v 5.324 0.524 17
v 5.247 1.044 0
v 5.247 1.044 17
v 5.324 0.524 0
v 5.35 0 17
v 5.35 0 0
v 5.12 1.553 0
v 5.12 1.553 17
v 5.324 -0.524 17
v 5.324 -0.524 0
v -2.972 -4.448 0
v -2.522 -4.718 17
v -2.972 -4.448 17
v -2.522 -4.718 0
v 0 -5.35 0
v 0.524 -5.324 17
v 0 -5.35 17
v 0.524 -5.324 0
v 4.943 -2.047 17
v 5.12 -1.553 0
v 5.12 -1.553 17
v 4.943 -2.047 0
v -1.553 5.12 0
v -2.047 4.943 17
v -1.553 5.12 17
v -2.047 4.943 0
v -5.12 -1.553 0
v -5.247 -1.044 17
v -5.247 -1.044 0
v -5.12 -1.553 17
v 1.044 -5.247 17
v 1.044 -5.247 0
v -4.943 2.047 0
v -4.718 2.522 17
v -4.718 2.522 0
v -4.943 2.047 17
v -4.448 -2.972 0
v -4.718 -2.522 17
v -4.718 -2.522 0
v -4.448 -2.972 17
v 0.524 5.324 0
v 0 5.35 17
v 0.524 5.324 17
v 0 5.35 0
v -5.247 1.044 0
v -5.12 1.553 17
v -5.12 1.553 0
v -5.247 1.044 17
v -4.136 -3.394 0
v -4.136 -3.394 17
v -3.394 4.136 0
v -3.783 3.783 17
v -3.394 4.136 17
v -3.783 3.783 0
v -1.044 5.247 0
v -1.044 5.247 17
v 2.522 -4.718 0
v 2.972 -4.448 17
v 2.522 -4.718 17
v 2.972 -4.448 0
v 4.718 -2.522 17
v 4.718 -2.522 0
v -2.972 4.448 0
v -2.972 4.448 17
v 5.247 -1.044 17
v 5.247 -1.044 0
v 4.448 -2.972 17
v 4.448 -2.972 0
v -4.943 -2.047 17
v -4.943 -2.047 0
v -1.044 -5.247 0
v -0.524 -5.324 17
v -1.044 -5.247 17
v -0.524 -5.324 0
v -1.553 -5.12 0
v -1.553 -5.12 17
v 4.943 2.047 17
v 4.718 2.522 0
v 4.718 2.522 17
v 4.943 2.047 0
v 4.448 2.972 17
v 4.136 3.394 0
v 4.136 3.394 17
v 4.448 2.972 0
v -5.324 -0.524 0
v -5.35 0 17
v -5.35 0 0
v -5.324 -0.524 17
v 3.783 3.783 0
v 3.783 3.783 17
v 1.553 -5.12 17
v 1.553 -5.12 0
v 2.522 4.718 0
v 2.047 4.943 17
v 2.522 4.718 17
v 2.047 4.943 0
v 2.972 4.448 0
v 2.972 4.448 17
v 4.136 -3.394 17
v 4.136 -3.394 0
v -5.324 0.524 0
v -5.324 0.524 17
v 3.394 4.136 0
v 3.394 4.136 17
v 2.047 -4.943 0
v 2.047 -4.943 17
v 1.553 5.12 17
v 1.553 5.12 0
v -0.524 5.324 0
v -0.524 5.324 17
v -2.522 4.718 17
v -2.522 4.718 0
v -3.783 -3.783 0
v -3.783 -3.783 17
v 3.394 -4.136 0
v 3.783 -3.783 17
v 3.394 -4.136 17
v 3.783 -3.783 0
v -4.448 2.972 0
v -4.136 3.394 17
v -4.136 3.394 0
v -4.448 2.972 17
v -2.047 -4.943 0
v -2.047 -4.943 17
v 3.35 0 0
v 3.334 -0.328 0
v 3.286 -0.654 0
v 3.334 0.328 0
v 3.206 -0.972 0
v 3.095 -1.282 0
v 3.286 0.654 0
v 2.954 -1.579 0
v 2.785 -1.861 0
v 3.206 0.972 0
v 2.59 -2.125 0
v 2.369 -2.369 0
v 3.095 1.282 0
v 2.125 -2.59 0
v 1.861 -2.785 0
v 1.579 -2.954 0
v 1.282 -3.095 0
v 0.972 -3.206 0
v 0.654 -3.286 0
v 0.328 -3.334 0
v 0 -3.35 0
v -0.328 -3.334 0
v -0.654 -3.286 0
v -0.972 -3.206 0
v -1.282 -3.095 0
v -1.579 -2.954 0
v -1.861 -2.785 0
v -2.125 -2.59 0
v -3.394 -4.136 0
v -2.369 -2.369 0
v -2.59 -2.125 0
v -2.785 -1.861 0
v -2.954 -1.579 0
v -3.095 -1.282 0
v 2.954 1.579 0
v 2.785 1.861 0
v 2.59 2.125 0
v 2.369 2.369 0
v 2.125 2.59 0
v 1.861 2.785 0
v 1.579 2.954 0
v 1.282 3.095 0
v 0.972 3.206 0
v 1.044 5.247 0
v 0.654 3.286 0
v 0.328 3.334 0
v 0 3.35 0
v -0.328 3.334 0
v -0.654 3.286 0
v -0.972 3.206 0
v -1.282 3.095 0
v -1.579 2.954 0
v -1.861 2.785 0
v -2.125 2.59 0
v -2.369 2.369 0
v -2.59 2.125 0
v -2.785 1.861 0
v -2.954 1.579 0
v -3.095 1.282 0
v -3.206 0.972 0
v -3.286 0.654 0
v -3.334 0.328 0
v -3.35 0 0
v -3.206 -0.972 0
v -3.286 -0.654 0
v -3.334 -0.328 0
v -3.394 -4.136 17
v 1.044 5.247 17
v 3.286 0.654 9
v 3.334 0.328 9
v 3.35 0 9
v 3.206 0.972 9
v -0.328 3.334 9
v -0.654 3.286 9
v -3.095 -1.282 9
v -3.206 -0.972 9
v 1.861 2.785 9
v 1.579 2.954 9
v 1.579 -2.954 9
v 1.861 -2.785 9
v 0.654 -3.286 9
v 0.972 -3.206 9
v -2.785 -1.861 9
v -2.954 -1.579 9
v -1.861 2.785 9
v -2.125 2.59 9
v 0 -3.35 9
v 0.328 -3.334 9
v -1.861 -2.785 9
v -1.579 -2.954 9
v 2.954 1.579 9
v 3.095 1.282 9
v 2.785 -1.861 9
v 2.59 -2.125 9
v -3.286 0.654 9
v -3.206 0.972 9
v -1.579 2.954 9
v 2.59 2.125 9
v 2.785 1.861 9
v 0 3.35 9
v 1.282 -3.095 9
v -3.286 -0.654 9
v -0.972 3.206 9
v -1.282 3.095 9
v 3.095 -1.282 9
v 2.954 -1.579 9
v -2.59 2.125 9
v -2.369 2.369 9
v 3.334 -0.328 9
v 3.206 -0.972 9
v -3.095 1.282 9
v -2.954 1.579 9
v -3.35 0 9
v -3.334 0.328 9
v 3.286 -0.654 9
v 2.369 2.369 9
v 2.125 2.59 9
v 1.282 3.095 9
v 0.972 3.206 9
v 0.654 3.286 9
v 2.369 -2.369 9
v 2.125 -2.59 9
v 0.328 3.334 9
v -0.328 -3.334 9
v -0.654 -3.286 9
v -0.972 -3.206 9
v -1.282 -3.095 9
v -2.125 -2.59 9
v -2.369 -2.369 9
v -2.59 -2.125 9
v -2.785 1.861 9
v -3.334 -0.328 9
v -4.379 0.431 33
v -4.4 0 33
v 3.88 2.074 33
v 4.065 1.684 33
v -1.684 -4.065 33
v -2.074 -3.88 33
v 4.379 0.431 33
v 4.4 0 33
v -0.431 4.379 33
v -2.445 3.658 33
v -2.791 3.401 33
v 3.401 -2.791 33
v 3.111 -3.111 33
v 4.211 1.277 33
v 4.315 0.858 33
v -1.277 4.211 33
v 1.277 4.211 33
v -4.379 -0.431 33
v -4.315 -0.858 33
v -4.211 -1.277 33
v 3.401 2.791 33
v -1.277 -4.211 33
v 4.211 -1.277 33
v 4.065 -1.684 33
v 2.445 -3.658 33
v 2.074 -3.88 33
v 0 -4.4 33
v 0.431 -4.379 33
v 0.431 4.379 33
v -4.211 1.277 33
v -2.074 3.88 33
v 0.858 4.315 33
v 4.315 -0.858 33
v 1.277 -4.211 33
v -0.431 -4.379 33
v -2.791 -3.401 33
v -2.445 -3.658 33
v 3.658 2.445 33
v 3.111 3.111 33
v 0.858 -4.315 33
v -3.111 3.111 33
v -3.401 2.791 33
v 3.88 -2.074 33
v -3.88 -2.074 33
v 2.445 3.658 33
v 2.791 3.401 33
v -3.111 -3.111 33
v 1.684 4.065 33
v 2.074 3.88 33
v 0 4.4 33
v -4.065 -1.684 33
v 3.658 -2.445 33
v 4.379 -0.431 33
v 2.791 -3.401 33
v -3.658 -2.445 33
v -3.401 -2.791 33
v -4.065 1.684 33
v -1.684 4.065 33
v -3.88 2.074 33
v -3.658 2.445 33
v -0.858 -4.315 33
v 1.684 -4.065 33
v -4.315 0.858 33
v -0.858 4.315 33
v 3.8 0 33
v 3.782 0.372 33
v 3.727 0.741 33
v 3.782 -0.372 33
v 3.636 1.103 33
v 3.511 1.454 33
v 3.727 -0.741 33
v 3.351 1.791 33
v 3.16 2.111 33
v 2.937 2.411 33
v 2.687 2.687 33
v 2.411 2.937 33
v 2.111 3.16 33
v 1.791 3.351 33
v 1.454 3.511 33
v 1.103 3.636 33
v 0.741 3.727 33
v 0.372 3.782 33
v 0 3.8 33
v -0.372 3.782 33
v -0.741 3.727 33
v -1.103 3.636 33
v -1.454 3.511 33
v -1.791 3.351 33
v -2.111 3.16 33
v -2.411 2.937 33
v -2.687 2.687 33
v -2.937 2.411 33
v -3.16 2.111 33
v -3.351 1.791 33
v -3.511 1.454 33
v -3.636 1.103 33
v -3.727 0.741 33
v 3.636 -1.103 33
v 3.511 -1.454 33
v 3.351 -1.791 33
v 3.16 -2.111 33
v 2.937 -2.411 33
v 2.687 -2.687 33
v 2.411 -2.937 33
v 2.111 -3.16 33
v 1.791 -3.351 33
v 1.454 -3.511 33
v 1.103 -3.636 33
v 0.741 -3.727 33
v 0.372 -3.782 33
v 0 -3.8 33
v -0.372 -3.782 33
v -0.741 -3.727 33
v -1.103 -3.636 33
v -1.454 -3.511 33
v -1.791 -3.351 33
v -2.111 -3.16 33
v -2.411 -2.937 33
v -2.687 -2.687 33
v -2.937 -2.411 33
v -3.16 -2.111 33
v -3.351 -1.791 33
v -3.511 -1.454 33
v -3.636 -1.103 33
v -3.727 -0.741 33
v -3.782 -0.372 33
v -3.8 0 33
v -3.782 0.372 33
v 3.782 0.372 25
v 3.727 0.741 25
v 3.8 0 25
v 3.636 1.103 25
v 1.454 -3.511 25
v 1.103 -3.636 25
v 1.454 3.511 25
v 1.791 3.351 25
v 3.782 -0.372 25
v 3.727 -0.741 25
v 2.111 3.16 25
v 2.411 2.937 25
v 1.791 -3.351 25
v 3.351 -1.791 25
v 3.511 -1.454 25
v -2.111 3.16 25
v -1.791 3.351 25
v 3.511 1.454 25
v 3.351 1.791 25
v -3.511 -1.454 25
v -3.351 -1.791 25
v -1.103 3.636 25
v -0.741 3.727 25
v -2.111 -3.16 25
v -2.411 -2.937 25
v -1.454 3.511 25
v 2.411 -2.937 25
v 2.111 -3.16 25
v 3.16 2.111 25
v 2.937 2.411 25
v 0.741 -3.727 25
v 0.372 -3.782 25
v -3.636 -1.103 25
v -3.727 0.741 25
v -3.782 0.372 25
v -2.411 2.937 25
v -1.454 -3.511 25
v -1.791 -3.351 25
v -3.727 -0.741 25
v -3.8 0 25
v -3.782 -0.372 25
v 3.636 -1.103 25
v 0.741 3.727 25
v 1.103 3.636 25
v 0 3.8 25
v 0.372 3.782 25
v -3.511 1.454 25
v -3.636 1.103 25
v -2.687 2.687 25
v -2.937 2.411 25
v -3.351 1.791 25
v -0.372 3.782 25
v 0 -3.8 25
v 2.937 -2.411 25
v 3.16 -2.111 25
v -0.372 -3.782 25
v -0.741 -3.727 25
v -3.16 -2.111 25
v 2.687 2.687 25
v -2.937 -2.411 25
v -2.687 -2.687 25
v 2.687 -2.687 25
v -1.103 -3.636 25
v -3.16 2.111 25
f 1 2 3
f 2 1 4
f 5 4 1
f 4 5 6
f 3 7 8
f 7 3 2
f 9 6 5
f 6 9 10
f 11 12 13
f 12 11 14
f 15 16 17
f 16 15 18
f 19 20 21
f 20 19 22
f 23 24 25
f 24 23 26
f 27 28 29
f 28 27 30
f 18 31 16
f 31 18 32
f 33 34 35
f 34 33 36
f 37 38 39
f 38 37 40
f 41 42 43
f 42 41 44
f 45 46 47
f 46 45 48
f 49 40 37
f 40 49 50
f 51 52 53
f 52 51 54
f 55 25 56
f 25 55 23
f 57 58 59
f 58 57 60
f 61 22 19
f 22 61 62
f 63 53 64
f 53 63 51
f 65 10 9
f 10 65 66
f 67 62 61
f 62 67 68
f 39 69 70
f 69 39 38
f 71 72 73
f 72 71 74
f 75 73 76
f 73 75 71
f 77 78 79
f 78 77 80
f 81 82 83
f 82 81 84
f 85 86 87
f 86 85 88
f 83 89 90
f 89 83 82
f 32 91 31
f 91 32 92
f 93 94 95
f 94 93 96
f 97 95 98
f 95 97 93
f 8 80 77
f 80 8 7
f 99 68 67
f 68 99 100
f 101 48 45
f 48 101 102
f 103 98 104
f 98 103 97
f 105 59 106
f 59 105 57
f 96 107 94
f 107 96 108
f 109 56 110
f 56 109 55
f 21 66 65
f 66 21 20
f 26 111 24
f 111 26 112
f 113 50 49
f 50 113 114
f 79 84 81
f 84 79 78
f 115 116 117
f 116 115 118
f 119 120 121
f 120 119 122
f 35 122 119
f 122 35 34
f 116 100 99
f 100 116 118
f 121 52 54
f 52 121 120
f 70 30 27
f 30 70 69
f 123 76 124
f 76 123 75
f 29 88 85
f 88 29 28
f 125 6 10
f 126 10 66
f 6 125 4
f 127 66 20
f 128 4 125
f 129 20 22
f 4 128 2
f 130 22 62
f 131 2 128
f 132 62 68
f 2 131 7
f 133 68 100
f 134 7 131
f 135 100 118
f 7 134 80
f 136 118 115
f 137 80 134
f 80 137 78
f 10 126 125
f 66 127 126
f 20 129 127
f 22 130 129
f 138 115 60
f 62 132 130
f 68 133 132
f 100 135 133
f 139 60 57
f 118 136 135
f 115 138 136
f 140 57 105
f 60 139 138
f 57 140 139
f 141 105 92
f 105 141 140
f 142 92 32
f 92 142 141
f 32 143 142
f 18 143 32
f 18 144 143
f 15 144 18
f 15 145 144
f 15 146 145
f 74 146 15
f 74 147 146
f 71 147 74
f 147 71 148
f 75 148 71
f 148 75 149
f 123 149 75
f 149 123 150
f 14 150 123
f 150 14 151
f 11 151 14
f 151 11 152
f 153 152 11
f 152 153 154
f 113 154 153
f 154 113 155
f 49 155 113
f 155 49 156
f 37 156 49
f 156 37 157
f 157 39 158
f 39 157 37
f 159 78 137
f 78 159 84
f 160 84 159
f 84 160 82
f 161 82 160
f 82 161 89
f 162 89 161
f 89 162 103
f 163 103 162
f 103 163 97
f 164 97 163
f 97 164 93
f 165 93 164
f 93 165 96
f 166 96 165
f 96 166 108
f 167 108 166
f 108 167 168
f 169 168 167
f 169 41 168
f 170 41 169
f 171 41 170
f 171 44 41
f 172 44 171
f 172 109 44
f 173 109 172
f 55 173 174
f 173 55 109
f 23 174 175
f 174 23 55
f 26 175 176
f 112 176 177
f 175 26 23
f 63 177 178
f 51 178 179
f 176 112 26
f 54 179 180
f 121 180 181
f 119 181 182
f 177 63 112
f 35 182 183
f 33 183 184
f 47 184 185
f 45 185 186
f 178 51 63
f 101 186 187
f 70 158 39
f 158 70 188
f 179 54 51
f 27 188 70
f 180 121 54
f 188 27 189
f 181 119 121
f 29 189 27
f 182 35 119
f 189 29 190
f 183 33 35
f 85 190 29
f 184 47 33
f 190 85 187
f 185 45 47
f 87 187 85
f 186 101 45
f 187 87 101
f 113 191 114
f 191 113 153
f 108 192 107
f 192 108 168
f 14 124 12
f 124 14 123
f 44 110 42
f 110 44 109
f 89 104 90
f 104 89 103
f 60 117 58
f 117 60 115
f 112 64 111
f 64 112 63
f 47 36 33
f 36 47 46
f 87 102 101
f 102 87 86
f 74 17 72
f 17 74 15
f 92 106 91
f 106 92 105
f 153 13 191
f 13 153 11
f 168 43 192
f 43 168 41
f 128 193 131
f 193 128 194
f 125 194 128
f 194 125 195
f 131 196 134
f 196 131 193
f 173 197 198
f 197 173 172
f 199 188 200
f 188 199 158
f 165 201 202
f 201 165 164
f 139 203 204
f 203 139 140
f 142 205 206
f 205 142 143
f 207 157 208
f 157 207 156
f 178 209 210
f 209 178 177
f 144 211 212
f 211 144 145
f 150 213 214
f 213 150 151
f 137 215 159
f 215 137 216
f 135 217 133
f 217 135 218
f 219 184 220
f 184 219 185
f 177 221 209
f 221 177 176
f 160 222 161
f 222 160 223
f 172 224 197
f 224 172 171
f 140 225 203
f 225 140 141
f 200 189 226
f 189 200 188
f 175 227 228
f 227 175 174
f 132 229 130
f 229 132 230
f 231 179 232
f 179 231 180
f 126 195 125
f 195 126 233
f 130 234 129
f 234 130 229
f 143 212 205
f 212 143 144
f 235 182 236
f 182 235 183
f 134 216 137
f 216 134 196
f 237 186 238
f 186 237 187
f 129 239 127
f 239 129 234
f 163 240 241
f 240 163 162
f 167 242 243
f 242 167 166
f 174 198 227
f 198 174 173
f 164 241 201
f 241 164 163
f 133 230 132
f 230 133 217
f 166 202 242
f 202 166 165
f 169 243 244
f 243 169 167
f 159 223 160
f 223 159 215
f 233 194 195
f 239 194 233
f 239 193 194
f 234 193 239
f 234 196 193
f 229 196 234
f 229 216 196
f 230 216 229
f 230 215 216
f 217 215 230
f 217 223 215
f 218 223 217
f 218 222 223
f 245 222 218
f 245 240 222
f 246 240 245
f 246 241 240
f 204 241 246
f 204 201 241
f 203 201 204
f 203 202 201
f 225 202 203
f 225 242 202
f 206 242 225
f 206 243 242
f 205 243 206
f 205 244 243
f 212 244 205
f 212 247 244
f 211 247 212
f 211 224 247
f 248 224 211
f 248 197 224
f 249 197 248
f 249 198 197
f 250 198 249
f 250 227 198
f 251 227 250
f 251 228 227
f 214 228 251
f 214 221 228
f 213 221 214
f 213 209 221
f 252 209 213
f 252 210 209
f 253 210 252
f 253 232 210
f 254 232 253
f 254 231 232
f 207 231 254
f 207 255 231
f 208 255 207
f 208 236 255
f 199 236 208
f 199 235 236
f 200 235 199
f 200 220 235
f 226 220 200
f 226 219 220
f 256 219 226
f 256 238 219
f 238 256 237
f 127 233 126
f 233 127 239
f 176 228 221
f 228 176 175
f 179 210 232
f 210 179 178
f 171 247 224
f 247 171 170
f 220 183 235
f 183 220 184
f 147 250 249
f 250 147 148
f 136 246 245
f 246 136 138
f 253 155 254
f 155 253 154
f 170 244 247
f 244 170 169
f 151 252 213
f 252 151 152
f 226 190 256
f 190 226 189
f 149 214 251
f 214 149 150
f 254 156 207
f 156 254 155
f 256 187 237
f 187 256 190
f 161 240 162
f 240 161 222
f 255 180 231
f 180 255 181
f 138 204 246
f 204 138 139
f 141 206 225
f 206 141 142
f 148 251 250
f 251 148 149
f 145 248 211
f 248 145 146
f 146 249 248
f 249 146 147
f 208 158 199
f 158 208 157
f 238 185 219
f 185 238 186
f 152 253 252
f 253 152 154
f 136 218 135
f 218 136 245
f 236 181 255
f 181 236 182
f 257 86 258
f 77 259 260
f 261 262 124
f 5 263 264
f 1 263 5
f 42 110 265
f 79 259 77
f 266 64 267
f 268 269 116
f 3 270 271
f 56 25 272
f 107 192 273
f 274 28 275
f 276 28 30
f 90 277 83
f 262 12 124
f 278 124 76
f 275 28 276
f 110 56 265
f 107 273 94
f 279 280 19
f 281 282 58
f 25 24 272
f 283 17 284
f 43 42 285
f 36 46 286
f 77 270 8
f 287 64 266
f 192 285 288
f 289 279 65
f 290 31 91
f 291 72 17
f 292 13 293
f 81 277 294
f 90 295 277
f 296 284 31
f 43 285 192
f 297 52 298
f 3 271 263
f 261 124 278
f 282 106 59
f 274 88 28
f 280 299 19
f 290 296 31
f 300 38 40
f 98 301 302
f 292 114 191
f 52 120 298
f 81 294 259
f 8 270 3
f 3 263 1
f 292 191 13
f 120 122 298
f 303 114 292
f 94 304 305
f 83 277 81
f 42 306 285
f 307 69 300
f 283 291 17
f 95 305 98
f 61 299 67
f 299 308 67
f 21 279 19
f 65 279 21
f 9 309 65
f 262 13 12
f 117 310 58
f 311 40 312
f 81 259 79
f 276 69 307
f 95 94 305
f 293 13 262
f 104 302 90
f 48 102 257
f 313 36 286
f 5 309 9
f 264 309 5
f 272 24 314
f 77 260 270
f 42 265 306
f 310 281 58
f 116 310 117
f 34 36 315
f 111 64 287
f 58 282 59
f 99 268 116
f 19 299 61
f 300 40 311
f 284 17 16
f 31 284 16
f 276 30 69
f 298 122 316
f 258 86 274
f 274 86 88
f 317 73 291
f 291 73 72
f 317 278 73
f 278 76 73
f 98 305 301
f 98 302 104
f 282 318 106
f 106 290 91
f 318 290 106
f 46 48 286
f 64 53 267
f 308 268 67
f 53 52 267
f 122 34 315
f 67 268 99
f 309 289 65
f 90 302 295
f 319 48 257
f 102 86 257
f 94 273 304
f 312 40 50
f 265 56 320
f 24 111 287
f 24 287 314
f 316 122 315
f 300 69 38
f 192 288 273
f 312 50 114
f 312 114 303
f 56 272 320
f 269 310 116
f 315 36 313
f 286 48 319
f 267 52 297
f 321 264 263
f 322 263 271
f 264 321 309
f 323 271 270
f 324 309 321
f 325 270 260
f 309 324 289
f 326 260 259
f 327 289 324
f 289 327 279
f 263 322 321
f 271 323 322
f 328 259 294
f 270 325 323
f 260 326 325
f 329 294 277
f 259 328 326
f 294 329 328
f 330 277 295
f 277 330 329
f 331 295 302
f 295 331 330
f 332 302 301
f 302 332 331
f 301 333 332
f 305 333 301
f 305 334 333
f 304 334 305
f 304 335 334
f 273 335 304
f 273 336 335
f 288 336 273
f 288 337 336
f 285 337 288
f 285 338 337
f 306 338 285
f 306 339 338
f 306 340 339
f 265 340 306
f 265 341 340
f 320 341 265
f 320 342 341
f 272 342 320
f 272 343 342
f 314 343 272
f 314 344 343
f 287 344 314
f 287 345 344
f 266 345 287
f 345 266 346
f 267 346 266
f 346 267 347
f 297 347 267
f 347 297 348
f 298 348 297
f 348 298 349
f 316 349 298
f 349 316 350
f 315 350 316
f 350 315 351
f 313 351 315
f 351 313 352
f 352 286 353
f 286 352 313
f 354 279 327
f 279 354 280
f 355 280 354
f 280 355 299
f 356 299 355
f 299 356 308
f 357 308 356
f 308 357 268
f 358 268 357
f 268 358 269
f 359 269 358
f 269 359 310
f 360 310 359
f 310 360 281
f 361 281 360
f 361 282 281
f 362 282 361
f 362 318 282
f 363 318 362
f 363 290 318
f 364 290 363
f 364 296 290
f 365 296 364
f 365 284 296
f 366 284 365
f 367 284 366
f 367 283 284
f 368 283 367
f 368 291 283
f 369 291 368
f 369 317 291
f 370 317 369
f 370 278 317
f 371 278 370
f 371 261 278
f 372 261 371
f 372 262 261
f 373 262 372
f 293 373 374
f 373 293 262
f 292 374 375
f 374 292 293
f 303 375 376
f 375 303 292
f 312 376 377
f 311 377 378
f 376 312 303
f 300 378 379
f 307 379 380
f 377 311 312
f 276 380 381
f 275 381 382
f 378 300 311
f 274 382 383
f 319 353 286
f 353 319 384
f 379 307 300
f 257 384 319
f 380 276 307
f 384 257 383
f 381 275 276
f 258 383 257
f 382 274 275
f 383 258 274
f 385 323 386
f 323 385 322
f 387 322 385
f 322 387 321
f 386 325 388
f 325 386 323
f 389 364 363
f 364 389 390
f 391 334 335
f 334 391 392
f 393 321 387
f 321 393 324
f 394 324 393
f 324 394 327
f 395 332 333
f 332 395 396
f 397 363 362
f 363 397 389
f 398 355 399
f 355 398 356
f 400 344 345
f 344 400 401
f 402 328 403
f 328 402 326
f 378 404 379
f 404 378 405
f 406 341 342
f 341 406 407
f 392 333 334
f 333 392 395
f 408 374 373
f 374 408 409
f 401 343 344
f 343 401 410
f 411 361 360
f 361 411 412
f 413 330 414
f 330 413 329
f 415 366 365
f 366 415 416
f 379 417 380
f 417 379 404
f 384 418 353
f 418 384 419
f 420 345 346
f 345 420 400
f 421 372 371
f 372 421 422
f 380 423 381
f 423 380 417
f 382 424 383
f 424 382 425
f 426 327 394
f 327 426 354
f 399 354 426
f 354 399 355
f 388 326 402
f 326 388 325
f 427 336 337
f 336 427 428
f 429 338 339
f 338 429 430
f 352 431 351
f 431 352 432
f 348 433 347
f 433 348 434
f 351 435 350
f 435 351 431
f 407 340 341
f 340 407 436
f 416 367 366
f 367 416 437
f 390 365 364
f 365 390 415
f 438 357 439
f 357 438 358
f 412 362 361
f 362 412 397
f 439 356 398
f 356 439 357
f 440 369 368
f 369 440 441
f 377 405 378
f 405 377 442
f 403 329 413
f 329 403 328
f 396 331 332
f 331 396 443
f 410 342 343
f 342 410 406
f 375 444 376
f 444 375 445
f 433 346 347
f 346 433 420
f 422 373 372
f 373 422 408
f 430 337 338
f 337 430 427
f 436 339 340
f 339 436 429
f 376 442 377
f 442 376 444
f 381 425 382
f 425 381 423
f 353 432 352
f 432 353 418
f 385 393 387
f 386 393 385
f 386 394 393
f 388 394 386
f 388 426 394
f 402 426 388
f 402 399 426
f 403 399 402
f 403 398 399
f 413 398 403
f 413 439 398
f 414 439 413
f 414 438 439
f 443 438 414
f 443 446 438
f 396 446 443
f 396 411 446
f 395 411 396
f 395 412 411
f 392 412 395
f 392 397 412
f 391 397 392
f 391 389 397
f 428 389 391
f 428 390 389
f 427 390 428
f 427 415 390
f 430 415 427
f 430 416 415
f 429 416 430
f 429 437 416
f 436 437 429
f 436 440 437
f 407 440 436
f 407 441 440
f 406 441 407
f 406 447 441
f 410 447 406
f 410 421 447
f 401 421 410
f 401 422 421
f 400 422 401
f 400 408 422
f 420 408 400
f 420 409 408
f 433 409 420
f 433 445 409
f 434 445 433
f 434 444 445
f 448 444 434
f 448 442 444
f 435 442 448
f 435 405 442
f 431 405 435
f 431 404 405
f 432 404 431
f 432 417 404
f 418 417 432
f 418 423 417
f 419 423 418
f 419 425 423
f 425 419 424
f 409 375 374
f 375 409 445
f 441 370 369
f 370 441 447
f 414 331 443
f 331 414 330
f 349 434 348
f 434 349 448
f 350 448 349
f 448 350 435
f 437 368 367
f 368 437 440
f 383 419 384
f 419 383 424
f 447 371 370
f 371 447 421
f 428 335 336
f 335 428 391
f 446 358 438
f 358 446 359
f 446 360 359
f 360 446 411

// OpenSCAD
//-- Parametric Traxxas 5347 carbon fiber rod connector
//-- Parametric: rod diameter can be adjusted as well as length and tolerance
//-- Assembly requires epoxy glue.
//-- AndrewBCN - Barcelona - March 2015
//-- GPLV3
//-- Please read the terms of the GPLV3 and please comply with it
//-- if remixing this part. Thank you.
//-- Origin: http://www.thingiverse.com/thing:725121
//-- Heavely modified: Tom Coetser <fitzterra@icave.net> 2016

$fn=64;

// Print tolerance
tolerance=0.6;

// Rod info
rod_dia=6.1; // Best is to meassure the actual rod diameter
rod_inset=9; // How deep should the rod side fit into the connector
rod_extra=8; // Any optional extra length to add to the rod side - extends the rod
rod_wall=2; // Wall thickness on rod side
rodDia=rod_dia+tolerance+rod_wall*2; // 2 walls per side

// Traxxas 5347 info
trx_dia=7;
trx_inset=8; // How deep should the traxxas fit into connector.
trx_extra=8; // Any optional extra length to add to traxxas side - extends the rod
trx_wall=0.6; // Wall thickness on traxxas side
trxDia = trx_dia+tolerance+trx_wall*2;    // 2 Walls per side

// There are other ball joints that have a hex end instead of a round connector
// end. Not sure if these are traxxas or not, but I got one of these in the 12
// I ordered from Bangood :-( It's also slightly shorter than the traxxas. The
// hex diameter below is the distance between the furthest edges on the hex
// shaft side. If specifying hexEnd=true to the TraxxasEnd() module, if will
// add a hex shaped hole to fit this rod end.
joint_hex_dia = 6.5;
joint_hex_inset = 7;

// Output connector info
echo("Connector rod diameter: ", rodDia);
echo("Connector full length: ", rod_inset+rod_extra+trx_inset+trx_extra);
echo("Will extend rod length by: ", rod_extra+trx_extra);

/**
 * Connector for rod end side.
 **/
module RodEnd() {
    difference() {
        // Outer cylinder
        cylinder(d=rodDia, h=rod_inset+rod_extra);
        // Cut out the inset to the specified tolerance across the diameter
        translate([0, 0, -1])
            cylinder(d=rod_dia+tolerance, h=rod_inset+1);
    }
}

/**
 * Connector for traxxas end side.
 *
 * @param hexEnd: If true, it will make a hexagonal hole for the ball joint
 *        connector end. See the description above for the joint_hex_dia variable.
 **/
module TraxxasEnd(hexEnd=false) {
    // Height is always based on the traxxas parameters
    height = trx_inset + trx_extra;
    // The inset hole depends on the hexEnd param
    inset_height = height - (hexEnd==false ? trx_inset : joint_hex_inset);
    difference() {
        // The traxxas side tapers from the rod diameter to the traxxas dia
        cylinder(d1=rodDia, d2=trxDia, h=height);
        translate([0, 0, inset_height])
            if (hexEnd==false)
                // Normal traxxas round hole
                cylinder(d=trx_dia+tolerance, h=trx_inset+1);
            else
                // Hexagonal rod end hole
                cylinder(d=joint_hex_dia+tolerance, h=joint_hex_inset+1, $fn=6);
    }
}

/**
 * Complete connector
 **/
module Connector(hexEnd=false) {
    RodEnd();
    translate([0, 0, rod_inset+rod_extra])
        TraxxasEnd(hexEnd);
}

Connector(false);
